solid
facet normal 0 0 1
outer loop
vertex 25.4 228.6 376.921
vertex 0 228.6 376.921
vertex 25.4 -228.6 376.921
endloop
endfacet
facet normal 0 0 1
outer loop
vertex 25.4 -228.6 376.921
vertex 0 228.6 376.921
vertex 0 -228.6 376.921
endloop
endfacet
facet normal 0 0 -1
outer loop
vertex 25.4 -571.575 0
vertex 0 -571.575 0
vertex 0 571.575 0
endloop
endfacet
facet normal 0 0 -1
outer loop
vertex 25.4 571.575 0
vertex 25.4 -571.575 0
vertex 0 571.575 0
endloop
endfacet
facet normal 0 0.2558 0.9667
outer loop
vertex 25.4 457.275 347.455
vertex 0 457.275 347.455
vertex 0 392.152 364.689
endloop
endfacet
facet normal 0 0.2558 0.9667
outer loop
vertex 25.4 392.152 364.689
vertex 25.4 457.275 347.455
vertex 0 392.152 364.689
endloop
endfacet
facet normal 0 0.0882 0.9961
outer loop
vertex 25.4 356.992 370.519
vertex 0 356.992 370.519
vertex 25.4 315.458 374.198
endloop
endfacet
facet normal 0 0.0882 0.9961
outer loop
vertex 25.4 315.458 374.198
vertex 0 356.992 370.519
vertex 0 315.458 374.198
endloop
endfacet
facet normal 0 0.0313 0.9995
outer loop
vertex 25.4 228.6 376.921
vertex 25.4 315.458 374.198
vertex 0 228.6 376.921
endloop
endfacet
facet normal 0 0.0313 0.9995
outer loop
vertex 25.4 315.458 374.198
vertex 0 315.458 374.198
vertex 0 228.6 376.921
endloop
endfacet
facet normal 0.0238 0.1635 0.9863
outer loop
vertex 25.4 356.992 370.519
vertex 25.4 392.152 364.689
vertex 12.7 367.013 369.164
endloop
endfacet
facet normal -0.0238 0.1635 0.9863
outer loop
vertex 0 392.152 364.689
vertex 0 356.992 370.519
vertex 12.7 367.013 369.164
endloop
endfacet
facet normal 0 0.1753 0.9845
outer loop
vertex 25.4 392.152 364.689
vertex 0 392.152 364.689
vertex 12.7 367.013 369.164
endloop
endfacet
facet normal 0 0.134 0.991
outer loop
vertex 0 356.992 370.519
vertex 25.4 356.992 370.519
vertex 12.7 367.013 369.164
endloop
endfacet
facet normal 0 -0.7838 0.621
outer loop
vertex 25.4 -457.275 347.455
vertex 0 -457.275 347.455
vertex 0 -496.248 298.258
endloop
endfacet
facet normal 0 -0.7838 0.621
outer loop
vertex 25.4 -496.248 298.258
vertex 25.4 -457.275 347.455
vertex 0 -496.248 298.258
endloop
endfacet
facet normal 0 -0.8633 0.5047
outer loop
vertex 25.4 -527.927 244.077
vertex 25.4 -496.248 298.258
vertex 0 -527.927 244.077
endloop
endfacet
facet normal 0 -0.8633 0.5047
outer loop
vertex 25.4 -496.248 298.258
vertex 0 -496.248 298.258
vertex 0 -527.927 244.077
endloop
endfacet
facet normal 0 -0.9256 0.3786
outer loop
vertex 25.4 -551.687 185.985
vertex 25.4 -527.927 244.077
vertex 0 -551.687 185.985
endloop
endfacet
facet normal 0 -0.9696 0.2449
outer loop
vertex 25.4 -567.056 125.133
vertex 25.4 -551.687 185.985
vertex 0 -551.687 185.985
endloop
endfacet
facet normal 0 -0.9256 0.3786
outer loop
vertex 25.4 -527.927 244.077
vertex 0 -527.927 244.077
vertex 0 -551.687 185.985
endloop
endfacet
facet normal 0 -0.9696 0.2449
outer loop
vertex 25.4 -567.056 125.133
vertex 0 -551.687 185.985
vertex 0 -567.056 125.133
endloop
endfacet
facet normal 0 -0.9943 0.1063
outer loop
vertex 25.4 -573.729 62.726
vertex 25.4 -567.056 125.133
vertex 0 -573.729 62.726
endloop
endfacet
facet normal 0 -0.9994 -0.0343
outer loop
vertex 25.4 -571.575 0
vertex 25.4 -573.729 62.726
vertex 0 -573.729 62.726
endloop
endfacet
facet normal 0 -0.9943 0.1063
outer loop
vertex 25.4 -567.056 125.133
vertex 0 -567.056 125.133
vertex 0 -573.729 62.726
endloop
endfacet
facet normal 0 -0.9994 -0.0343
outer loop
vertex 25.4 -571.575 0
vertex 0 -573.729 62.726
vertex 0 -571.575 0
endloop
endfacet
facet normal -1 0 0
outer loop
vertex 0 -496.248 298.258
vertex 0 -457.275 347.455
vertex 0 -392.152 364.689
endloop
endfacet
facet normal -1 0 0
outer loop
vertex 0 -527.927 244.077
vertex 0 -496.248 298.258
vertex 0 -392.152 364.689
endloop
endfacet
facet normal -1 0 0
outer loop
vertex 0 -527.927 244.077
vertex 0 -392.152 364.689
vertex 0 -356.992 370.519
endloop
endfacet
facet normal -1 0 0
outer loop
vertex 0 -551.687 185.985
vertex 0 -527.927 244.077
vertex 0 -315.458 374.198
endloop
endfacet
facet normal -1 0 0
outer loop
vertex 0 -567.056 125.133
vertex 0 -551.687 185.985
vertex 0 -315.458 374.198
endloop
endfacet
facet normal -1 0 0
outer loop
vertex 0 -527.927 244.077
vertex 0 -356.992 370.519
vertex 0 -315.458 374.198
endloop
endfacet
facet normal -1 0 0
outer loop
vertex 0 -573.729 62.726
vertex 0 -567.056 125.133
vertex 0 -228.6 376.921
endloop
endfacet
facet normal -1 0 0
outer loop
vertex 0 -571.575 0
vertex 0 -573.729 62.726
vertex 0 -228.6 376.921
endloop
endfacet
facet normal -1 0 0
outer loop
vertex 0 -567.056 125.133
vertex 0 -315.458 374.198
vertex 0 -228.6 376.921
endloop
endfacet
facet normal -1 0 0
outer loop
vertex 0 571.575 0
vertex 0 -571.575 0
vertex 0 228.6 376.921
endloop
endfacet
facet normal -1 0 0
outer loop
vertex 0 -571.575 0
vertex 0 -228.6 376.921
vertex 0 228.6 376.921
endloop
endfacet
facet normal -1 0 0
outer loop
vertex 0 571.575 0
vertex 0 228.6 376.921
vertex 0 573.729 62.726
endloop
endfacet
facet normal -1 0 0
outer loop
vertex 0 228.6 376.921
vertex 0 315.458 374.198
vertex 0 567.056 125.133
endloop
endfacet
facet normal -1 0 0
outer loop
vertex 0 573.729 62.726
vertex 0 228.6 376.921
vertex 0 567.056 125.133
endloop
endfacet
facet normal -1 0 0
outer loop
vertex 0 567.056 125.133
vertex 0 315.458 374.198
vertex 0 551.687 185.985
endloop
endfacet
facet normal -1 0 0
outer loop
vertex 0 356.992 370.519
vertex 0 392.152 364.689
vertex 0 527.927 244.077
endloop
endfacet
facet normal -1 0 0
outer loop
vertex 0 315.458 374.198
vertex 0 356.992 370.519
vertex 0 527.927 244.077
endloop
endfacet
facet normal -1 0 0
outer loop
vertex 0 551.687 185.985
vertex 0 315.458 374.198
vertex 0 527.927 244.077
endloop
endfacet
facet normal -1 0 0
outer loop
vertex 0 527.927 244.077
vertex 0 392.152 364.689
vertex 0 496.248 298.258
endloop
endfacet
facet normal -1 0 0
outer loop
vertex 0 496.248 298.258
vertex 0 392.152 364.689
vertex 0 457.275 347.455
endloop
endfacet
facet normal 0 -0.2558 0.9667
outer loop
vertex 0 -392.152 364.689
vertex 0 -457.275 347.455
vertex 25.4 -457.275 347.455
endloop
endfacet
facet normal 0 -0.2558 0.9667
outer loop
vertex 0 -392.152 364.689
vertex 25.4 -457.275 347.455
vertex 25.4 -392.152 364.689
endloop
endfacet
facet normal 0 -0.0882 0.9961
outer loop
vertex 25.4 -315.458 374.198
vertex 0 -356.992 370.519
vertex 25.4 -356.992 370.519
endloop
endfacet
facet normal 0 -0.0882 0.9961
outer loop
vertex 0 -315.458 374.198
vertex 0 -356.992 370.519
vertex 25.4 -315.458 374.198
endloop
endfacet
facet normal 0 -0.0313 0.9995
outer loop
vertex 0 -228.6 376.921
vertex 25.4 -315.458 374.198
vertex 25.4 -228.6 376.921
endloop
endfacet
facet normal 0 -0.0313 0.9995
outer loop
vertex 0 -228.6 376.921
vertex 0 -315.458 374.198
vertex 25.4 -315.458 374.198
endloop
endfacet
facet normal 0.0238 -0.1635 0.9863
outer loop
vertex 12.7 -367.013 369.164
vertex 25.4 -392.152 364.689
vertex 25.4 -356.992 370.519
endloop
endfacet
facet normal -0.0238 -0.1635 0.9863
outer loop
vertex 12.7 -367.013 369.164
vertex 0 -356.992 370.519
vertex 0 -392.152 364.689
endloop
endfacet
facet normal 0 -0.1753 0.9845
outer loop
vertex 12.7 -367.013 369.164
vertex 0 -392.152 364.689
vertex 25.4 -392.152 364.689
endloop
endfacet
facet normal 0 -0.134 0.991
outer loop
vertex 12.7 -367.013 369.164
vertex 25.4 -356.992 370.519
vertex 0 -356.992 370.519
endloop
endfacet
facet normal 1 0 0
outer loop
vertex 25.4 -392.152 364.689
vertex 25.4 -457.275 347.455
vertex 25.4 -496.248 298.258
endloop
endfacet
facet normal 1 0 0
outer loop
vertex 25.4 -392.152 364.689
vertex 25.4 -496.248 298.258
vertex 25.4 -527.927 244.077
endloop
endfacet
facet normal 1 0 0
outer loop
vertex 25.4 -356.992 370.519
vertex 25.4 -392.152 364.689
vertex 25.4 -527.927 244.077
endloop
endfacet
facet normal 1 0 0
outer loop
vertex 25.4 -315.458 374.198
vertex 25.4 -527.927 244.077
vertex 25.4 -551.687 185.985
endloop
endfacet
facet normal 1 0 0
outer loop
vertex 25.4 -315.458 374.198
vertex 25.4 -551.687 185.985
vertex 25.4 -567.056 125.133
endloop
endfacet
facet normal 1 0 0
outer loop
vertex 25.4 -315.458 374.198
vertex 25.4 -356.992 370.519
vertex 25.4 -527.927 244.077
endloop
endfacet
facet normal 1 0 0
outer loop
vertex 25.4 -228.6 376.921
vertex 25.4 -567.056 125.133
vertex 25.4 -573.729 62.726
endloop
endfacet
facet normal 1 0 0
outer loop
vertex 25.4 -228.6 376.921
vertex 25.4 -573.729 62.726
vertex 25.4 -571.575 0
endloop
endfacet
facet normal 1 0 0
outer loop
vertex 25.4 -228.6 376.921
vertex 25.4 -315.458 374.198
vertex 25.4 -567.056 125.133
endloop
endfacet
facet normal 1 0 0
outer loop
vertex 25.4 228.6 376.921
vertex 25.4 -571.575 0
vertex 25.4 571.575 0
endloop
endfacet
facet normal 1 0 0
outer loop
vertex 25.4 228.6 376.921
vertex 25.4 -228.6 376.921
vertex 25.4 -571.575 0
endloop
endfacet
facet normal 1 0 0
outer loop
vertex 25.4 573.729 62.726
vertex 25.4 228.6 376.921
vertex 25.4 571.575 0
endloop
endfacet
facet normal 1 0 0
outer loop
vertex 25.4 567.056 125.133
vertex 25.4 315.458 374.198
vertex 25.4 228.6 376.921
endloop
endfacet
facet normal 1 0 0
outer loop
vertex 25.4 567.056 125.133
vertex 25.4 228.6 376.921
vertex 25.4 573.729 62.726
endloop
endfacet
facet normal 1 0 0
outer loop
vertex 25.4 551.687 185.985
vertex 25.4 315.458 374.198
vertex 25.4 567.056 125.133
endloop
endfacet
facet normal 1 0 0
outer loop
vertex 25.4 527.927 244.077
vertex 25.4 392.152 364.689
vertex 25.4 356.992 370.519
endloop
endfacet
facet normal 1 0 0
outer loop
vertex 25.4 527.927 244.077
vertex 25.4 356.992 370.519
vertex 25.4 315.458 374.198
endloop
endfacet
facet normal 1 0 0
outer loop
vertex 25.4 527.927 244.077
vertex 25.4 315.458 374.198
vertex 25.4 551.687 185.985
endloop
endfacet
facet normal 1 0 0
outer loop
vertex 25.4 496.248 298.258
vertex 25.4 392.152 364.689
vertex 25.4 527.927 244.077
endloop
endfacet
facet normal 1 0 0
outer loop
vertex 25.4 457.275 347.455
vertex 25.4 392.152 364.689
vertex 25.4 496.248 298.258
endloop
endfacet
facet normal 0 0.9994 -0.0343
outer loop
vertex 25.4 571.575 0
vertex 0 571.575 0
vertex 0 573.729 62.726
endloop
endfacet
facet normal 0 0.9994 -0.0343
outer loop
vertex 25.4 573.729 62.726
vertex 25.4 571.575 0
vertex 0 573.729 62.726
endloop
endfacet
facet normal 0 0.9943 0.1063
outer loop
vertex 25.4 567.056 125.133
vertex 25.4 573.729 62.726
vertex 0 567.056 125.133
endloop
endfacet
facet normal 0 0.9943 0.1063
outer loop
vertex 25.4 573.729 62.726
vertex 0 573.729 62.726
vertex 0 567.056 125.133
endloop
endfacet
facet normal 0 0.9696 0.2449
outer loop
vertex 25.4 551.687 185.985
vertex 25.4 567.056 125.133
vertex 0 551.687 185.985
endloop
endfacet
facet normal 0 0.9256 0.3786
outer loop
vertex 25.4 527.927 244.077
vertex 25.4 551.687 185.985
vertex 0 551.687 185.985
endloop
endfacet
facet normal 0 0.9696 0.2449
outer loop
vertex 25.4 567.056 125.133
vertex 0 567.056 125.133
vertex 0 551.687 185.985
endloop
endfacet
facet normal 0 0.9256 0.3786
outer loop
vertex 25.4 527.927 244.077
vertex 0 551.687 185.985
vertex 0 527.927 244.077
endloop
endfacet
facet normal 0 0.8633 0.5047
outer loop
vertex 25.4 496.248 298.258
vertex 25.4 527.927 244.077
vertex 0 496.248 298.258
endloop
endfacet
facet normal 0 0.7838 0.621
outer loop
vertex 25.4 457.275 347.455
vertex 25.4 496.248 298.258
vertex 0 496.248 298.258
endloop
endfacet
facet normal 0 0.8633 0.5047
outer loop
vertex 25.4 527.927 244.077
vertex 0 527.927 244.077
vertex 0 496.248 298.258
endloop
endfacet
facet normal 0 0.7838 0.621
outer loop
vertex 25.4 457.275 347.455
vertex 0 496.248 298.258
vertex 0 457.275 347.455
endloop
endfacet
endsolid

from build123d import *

# Parameters (mm, degrees)
F1_DEPTH = 25.4


with BuildPart() as f1:
    # F0 (on Right) → F1 (new body)
    with BuildSketch(Plane.YZ):
        with BuildLine():
            Line((228.6, 376.9212961197), (0, 376.9212961197))
            Line((0, 376.9212961197), (-228.6, 376.9212961197))
            add(Edge.make_bspline(
                [(-457.2753436089, 347.454816103), (-428.9132900906, 355.8432406544), (-365.8930365544, 374.4822521654), (-277.3142184262, 376.0558762636), (-228.6, 376.9212961197)],
                knots=[0, 0, 0, 0, 0.4500466426, 1, 1, 1, 1], degree=3))
            ThreePointArc((-457.2753436089, 347.454816103), (-551.68686479, 185.9850935796), (-571.5753436089, 0))
            Line((-571.5753436089, 0), (0, 0))
            Line((0, 0), (571.5753436089, 0))
            ThreePointArc((571.5753436089, 0), (551.68686479, 185.9850935796), (457.2753436089, 347.454816103))
            add(Edge.make_bspline(
                [(457.2753436089, 347.454816103), (428.9132900906, 355.8432406544), (365.8930365544, 374.4822521654), (277.3142184262, 376.0558762636), (228.6, 376.9212961197)],
                knots=[0, 0, 0, 0, 0.4500466426, 1, 1, 1, 1], degree=3))
        make_face()
    extrude(amount=F1_DEPTH)


solid = f1.part
